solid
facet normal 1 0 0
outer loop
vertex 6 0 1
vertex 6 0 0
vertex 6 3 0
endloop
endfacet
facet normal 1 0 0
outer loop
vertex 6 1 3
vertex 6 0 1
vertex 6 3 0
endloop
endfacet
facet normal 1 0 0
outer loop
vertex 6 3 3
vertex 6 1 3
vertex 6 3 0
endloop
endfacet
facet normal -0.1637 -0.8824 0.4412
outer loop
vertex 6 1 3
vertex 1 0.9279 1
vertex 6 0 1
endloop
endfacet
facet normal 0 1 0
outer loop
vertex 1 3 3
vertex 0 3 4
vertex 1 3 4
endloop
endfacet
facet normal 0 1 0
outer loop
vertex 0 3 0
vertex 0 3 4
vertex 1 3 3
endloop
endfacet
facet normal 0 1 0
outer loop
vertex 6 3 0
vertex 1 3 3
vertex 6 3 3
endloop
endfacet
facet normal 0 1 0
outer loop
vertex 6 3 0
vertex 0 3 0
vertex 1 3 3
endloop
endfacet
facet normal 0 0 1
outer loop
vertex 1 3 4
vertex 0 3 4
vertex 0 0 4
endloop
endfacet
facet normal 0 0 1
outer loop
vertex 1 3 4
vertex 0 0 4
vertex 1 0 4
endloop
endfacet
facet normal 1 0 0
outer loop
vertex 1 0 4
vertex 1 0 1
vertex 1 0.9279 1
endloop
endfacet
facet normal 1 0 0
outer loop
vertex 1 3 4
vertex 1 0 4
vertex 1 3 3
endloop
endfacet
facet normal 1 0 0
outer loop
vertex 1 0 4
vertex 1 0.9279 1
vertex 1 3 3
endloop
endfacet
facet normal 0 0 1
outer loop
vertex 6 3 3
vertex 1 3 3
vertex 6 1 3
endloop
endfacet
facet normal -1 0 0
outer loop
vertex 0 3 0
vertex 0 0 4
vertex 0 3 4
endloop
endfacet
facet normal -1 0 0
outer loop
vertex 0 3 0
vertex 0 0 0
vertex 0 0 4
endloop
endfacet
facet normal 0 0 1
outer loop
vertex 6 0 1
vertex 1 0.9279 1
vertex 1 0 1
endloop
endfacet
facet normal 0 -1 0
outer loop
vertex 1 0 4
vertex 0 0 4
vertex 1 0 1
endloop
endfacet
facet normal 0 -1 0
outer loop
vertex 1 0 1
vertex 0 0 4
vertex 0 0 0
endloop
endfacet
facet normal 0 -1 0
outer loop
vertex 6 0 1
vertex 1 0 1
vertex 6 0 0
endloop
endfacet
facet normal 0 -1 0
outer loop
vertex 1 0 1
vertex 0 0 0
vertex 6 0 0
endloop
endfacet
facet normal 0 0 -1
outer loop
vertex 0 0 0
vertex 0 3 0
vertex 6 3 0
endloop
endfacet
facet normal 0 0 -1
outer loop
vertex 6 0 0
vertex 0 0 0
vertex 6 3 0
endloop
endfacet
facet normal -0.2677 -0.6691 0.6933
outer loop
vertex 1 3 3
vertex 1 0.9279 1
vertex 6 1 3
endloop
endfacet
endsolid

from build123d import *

# Parameters (mm, degrees)
F0_W      = 6
F0_H      = 3
F1_DEPTH  = 3
F2_W      = 1
F2_H      = 3
F3_DEPTH  = 1
F5_DEPTH  = 2
F9_DEPTH  = 3
F10_DEPTH = 25
F14_DEPTH = 25
F15_W     = 1
F15_H     = 3
F16_DEPTH = 3


with BuildPart() as f1:
    # F0 (on Top) → F1 (new body)
    with BuildSketch(Plane.XY):
        with Locations((3, 1.5)):
            Rectangle(F0_W, F0_H)
    extrude(amount=F1_DEPTH)

    # F2 (on face) → F3 (join)
    with BuildSketch(Plane.XY.offset(3)):
        with Locations((0.5, 1.5)):
            Rectangle(F2_W, F2_H)
    extrude(amount=F3_DEPTH)

    # F4 (on face) → F5 (cut)
    with BuildSketch(Plane.XY.offset(3)):
        Polygon((1, 0.9279345977), (1, 0), (6, 0), align=None)
    extrude(amount=-F5_DEPTH, mode=Mode.SUBTRACT)

    # F9 (cut): a face of the model
    f9_faces = [f1.faces().sort_by_distance(p)[0] for p in [
        (0.5, 1.5, 4),
    ]]
    extrude(f9_faces, amount=-F9_DEPTH, mode=Mode.SUBTRACT)

    # F8 (on 3pt) → F10 (cut)
    with BuildSketch(Plane(origin=(0.0522802245, 0.1307005612, -0.1354100555), x_dir=(0.9635139775, -0.1858842133, 0.1925821236), z_dir=(0.2676580189, 0.6691450473, -0.6932561508))):
        Polygon((0.9836077085, -1.3621405037), (0.9836077085, -4.241976442), (6.1729460228, -2.80296016), align=None)
    extrude(amount=-F10_DEPTH, mode=Mode.SUBTRACT)

    # F13 (on 3pt) → F14 (cut)
    with BuildSketch(Plane(origin=(0.0886466837, 0.4776558818, -0.2388279409), x_dir=(0.9865013232, -0.1464653934, 0.0732326967), z_dir=(-0.163753288, -0.8823536074, 0.4411768037))):
        Polygon((1.090059639, 3.2898643985), (0.923823714, 1.3094121588), (5.9922406359, 0.894427191), (6.7155025899, 0.894427191), (6.2731583603, 3.703357419), align=None)
    extrude(amount=F14_DEPTH, mode=Mode.SUBTRACT)

    # F15 (on face) → F16 (join)
    with BuildSketch(Plane.XY.offset(1)):
        with Locations((0.5, 1.5)):
            Rectangle(F15_W, F15_H)
    extrude(amount=F16_DEPTH)


solid = f1.part
